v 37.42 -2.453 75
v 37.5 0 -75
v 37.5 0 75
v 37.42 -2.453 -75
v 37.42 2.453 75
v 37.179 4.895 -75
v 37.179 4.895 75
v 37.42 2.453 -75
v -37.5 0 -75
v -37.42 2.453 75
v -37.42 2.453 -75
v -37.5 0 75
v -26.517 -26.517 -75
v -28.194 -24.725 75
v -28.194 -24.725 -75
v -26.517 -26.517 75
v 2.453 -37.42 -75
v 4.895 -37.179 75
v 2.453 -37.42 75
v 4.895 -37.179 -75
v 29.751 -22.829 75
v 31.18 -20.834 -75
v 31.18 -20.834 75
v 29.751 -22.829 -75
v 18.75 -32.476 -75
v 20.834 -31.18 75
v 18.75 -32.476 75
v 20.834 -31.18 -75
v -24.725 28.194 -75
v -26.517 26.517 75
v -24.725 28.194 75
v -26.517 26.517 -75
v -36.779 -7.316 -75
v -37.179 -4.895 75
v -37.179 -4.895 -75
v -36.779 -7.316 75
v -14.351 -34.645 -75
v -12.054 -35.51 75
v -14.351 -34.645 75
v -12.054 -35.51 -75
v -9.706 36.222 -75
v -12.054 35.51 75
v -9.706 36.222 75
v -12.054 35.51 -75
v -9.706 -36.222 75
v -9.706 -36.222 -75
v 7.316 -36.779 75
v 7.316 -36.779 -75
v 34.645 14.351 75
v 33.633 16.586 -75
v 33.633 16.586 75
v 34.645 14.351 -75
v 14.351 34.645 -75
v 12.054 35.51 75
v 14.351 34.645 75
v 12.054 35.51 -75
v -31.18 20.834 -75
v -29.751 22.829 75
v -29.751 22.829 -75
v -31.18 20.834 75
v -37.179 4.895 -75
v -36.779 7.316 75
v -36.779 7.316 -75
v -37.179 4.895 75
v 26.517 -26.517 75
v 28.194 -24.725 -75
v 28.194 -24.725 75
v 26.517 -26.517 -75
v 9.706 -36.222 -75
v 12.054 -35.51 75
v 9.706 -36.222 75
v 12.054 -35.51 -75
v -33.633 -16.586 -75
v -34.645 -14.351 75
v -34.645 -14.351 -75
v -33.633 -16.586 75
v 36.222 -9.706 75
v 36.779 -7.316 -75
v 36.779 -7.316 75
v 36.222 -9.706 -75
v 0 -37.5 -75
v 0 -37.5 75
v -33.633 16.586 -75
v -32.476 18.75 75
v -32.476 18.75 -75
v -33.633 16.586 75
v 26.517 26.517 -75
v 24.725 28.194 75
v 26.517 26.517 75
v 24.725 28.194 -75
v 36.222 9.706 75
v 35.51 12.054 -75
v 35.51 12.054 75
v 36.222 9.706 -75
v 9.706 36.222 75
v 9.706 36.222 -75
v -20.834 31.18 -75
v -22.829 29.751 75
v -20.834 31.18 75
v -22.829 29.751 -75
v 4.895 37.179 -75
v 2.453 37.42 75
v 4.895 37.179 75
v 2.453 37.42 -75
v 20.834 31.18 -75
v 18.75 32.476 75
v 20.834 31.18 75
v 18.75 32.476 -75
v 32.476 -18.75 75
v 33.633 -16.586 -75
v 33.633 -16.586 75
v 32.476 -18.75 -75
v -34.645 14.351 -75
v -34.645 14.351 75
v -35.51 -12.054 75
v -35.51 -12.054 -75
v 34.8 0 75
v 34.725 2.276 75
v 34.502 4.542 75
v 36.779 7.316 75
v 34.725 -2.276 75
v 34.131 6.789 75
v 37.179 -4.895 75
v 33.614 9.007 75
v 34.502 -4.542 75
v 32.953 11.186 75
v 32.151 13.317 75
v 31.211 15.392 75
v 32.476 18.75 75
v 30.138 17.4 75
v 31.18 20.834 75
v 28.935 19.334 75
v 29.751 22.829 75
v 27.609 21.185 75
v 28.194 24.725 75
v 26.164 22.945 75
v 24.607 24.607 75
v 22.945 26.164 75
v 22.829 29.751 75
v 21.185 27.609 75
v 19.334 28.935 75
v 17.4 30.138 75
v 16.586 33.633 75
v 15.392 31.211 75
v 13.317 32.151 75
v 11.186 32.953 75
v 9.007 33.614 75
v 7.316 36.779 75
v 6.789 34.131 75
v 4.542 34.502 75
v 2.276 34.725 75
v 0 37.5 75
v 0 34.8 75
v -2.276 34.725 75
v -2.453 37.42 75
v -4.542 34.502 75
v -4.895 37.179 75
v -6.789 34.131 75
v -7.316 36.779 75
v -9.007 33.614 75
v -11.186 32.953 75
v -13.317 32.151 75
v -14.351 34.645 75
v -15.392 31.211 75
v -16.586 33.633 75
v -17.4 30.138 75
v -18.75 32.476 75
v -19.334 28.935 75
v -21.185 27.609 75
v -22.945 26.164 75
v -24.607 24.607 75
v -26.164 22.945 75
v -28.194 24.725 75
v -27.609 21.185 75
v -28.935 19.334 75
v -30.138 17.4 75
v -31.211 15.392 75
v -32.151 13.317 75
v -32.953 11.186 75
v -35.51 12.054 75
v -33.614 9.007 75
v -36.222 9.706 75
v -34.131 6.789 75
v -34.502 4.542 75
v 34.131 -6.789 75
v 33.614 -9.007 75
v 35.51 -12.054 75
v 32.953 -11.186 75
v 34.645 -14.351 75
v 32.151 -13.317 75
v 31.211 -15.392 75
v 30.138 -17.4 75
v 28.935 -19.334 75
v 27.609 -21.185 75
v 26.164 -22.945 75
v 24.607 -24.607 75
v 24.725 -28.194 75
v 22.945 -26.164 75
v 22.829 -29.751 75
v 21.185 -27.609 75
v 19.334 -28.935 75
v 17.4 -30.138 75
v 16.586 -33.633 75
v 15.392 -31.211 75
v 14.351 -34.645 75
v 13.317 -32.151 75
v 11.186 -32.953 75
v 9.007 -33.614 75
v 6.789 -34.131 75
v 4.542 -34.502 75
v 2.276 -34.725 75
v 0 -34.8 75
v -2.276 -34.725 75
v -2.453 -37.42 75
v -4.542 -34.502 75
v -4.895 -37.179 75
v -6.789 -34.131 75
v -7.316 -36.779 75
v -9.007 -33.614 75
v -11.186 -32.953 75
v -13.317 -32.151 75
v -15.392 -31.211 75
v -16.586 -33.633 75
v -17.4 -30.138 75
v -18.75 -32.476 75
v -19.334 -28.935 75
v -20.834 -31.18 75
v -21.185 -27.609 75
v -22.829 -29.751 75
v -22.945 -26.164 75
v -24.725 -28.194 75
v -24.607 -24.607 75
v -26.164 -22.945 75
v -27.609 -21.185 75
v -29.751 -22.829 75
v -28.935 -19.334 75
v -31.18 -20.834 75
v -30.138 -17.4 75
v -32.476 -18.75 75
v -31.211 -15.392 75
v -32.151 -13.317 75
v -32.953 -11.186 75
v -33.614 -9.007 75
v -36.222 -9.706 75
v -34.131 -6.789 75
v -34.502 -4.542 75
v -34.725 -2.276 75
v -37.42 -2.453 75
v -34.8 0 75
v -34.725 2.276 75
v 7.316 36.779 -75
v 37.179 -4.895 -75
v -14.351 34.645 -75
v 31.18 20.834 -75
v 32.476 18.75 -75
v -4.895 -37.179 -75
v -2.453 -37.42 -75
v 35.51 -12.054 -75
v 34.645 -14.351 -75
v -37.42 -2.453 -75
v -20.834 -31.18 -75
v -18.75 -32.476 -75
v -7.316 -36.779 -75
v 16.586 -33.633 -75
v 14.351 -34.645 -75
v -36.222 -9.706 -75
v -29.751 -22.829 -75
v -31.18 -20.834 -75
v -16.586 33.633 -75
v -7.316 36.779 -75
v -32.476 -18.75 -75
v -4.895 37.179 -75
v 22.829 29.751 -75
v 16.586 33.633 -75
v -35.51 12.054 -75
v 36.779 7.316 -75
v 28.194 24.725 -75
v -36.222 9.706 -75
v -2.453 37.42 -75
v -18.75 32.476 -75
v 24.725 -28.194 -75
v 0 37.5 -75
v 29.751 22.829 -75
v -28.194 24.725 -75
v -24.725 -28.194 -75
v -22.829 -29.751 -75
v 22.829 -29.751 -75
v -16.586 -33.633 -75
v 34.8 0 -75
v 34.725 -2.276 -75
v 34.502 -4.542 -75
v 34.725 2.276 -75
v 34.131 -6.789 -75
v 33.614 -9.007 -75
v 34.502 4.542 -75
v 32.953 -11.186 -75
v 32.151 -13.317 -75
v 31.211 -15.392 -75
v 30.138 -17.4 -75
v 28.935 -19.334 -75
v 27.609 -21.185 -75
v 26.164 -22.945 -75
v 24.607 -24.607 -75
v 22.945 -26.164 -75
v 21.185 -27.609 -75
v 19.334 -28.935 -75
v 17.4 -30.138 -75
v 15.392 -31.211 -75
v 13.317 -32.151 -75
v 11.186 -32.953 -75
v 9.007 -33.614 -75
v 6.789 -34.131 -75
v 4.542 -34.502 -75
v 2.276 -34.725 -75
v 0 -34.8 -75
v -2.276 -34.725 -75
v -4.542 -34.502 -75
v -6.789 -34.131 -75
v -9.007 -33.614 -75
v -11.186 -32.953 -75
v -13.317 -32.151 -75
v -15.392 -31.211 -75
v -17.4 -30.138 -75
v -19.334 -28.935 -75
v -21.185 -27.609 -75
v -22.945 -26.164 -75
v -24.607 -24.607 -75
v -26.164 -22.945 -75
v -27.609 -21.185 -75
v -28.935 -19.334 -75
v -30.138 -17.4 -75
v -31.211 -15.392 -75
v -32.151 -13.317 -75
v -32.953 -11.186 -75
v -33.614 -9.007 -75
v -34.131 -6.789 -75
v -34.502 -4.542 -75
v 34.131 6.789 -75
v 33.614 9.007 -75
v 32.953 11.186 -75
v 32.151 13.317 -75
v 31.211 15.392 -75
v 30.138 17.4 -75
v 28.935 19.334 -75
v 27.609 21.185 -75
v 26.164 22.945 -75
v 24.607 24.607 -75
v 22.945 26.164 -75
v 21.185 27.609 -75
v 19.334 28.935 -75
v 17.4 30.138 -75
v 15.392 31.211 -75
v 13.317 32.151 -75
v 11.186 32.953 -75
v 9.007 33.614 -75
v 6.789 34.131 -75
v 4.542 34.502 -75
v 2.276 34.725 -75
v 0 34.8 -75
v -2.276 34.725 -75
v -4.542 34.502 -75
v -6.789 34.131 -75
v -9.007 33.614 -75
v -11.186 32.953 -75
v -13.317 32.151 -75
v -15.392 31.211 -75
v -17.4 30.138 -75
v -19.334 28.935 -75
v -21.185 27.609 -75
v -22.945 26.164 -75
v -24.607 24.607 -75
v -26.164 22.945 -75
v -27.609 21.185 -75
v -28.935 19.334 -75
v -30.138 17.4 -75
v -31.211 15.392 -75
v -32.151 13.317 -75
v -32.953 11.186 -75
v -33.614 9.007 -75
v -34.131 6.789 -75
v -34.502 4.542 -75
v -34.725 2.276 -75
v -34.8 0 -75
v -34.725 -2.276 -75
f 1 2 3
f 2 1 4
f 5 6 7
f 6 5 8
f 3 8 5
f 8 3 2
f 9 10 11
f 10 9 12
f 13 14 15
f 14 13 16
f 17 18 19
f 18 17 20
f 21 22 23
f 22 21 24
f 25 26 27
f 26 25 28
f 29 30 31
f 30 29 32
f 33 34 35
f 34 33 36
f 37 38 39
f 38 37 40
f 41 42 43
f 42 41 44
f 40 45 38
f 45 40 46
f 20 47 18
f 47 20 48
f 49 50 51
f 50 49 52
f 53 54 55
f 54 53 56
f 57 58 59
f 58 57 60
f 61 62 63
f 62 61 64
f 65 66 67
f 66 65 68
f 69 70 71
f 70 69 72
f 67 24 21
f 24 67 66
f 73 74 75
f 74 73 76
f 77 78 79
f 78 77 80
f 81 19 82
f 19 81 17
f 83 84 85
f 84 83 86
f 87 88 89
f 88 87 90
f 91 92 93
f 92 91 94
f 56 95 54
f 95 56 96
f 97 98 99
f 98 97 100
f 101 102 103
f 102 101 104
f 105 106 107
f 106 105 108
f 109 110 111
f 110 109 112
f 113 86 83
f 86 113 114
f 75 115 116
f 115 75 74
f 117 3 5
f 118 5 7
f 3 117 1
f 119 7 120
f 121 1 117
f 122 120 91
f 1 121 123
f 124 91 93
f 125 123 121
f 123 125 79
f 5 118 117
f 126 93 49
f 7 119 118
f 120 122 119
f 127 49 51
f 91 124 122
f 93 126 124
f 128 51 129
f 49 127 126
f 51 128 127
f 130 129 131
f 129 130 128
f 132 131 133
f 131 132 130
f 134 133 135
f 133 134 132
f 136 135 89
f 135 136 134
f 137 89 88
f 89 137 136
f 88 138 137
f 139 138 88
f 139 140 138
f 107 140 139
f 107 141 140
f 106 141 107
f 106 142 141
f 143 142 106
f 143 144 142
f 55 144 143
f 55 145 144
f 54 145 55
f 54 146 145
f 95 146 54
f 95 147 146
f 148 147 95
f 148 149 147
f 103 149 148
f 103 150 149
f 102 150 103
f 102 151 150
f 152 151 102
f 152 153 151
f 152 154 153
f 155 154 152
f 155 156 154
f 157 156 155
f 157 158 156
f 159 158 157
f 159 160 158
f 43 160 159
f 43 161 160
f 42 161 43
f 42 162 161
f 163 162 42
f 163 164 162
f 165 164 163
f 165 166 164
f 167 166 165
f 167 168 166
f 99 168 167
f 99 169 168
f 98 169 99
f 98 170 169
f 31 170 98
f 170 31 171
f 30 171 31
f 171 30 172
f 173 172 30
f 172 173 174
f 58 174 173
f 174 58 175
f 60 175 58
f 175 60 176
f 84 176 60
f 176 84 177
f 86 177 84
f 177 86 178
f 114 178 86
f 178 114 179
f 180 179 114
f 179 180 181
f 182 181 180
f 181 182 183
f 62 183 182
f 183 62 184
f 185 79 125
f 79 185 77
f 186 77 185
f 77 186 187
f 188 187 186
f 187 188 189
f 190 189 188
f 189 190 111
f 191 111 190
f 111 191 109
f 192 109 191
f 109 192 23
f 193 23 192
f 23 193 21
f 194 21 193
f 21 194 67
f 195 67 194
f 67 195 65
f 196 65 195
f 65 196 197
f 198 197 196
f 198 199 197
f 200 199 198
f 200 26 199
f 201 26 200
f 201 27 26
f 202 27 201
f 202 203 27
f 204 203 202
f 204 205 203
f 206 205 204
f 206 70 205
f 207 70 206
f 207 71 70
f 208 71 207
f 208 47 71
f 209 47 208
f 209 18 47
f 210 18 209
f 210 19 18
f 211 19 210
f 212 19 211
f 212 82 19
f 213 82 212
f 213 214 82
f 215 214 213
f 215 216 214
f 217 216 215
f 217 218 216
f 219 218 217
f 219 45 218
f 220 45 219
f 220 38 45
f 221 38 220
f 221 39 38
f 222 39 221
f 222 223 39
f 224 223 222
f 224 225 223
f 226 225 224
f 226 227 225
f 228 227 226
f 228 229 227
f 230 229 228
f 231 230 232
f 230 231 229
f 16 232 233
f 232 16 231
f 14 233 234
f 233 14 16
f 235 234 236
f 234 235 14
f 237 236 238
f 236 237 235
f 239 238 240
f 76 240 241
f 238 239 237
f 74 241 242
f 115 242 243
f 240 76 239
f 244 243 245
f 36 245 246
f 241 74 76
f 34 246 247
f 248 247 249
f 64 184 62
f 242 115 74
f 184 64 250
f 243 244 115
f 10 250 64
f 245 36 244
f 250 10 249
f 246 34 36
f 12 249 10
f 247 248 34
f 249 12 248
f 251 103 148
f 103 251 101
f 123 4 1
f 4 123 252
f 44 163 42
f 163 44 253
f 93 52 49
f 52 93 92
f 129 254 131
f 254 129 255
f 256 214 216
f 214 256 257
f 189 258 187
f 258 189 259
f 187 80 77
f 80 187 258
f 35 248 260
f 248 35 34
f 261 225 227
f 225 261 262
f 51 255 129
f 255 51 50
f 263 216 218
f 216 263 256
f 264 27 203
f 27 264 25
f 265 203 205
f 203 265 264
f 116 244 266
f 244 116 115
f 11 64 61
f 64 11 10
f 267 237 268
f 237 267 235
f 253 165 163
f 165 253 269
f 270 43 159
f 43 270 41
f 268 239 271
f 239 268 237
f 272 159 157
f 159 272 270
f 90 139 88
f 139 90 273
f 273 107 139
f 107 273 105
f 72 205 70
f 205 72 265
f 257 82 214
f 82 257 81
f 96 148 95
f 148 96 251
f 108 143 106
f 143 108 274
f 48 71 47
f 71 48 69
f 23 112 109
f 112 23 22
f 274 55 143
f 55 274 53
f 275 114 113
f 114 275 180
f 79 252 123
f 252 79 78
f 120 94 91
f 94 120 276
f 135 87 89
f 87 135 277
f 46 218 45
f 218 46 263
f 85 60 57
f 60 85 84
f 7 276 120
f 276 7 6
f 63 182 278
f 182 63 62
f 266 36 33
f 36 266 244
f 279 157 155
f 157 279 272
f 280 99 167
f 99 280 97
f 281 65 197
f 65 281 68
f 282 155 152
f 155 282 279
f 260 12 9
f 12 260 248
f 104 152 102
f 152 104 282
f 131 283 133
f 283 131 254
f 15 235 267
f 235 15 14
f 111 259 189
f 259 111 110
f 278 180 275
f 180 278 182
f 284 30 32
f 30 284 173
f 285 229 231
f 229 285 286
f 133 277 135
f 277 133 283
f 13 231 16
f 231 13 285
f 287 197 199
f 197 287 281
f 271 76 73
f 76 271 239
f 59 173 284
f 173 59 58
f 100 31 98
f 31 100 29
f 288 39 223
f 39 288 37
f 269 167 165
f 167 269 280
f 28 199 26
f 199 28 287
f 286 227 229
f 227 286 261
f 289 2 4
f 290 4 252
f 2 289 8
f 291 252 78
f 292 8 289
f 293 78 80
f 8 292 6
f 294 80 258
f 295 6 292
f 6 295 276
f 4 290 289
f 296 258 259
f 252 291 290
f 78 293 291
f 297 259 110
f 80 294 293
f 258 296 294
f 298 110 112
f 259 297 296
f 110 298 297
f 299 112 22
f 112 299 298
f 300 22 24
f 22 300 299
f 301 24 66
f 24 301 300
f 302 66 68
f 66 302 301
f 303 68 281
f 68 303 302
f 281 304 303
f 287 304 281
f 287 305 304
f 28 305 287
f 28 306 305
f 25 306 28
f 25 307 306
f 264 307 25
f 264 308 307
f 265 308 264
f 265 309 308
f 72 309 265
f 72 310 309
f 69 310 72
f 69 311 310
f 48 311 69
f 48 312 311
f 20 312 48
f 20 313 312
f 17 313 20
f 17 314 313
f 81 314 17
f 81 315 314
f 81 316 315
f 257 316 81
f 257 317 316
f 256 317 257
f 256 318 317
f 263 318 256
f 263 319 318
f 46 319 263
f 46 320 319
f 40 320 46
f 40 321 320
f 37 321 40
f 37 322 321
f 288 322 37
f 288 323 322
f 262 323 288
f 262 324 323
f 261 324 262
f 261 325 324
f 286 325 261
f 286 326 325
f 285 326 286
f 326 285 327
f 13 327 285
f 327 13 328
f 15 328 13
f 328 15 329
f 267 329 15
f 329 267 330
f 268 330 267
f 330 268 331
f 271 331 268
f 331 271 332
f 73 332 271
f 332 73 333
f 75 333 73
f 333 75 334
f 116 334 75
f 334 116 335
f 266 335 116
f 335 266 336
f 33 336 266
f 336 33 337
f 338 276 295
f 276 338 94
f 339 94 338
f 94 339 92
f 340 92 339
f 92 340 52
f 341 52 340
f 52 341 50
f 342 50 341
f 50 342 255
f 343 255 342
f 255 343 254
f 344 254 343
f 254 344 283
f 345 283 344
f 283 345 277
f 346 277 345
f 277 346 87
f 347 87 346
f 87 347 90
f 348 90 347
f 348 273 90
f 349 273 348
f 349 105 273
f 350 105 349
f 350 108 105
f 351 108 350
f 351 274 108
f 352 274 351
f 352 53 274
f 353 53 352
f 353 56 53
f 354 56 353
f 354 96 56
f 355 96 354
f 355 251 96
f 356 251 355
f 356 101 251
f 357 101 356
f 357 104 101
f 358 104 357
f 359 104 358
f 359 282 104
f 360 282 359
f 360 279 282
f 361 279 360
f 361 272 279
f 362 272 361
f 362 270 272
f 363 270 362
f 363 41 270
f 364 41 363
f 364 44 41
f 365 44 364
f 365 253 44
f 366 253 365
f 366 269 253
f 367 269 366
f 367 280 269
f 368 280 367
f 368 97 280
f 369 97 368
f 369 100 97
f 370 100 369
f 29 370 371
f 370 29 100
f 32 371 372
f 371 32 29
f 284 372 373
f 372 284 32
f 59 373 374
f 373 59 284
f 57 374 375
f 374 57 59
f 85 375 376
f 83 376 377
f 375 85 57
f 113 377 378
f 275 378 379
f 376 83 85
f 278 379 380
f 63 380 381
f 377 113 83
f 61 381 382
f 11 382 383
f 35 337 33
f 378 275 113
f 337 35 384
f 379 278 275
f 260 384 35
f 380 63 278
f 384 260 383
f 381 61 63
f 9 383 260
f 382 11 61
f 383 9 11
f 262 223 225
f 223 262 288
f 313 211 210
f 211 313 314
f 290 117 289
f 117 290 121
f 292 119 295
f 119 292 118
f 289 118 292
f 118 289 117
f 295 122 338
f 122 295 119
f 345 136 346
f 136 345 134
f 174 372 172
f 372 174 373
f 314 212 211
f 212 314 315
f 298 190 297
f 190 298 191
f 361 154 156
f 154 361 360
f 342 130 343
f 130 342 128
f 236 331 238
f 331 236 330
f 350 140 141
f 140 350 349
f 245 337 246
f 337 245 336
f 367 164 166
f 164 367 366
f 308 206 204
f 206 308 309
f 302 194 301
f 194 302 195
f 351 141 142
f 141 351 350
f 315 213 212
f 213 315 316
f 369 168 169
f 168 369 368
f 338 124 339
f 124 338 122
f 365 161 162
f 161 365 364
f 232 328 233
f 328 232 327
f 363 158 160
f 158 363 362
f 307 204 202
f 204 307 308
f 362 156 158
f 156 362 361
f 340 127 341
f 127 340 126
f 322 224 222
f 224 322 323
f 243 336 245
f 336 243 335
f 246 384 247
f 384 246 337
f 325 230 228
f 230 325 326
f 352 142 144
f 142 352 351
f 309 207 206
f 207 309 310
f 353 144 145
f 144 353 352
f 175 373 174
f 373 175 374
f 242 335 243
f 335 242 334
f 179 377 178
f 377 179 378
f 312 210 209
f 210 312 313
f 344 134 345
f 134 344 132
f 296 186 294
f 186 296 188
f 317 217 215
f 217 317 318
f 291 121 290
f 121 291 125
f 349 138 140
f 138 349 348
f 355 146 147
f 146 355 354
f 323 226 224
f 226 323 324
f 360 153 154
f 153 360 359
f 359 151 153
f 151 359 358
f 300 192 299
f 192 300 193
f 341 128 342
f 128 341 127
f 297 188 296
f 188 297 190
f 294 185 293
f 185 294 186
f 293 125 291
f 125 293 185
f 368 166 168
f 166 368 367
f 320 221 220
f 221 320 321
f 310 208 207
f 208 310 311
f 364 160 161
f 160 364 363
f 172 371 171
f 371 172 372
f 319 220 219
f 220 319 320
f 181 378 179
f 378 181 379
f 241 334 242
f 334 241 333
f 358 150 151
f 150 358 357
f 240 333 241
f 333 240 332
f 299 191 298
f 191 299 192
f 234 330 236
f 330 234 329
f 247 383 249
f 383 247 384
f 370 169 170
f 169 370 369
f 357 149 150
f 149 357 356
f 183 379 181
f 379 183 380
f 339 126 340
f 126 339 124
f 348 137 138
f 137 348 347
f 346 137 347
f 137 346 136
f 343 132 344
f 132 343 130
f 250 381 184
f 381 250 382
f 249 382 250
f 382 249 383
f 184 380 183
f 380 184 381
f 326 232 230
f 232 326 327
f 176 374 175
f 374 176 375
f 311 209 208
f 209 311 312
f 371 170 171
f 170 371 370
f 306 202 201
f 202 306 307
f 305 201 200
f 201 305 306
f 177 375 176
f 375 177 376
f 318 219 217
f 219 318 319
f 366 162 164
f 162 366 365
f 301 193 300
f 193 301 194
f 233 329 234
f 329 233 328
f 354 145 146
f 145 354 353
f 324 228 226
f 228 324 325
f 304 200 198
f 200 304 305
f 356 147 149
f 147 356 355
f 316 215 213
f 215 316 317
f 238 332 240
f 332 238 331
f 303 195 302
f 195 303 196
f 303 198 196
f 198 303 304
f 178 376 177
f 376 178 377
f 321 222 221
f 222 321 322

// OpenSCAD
$fn=96;

module ht_pipe(od=75, length=150, wall=2.7) {
    difference() {
        cylinder(h=length, d=od, center=true);
        cylinder(h=length+0.2, d=od-2*wall, center=true);
    }
}

ht_pipe(od=75, length=150, wall=2.7);
